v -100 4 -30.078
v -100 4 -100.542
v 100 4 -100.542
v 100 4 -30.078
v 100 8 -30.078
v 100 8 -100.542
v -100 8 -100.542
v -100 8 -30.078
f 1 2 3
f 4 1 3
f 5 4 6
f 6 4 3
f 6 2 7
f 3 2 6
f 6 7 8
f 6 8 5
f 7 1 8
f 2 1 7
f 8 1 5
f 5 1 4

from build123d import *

# Parameters (mm, degrees)
SKETCH1_W           = 170
SKETCH1_H           = 140
BOSS_EXTRUDE1_DEPTH = 4
SKETCH2_W           = 200
SKETCH2_H           = 70.464044802
BOSS_EXTRUDE2_DEPTH = 4
SKETCH3_W           = 180
SKETCH3_H           = 170
CUT_EXTRUDE2_DEPTH  = 10
SKETCH4_W           = 208.329429668
SKETCH4_H           = 25.795902732
CUT_EXTRUDE3_DEPTH  = 10


with BuildPart() as part:
    # Sketch1 → Boss-Extrude1 (new body)
    with BuildSketch(Plane(origin=(0, 0, 0), x_dir=(1, 0, 0), z_dir=(0, 1, 0))):
        with Locations((85, 70)):
            Rectangle(SKETCH1_W, SKETCH1_H)
    extrude(amount=BOSS_EXTRUDE1_DEPTH)

    # Sketch2 → Boss-Extrude2 (add)
    with BuildSketch(Plane(origin=(0, 4, 0), x_dir=(1, 0, 0), z_dir=(0, 1, 0))):
        with Locations((0, 65.310473928)):
            Rectangle(SKETCH2_W, SKETCH2_H)
    extrude(amount=BOSS_EXTRUDE2_DEPTH)

    # Sketch3 → Cut-Extrude2 (cut)
    with BuildSketch(Plane(origin=(0, 4, 0), x_dir=(1, 0, 0), z_dir=(0, 1, 0))):
        with Locations((80.942291323, 86.090427605)):
            Rectangle(SKETCH3_W, SKETCH3_H)
    extrude(amount=-CUT_EXTRUDE2_DEPTH, mode=Mode.SUBTRACT)


with BuildPart() as cut_extrude2_piece_1:
    # of the separate pieces the step leaves, piece 1, a body of its own (cut_extrude2_pieces)
    add(part.part.solids().sort_by_distance((100, 4, -30.078451527))[0])


with BuildPart() as cut_extrude2_piece_2:
    # of the separate pieces the step leaves, piece 2, a body of its own (cut_extrude2_pieces)
    add(part.part.solids().sort_by_distance((0, 0, 0))[0])

    # Sketch4 → Cut-Extrude3 (cut)
    with BuildSketch(Plane(origin=(0, 4, 0), x_dir=(1, 0, 0), z_dir=(0, 1, 0))):
        with Locations((90.618611287, -0.959663867)):
            Rectangle(SKETCH4_W, SKETCH4_H)
    extrude(amount=-CUT_EXTRUDE3_DEPTH, mode=Mode.SUBTRACT)


solid = cut_extrude2_piece_1.part
